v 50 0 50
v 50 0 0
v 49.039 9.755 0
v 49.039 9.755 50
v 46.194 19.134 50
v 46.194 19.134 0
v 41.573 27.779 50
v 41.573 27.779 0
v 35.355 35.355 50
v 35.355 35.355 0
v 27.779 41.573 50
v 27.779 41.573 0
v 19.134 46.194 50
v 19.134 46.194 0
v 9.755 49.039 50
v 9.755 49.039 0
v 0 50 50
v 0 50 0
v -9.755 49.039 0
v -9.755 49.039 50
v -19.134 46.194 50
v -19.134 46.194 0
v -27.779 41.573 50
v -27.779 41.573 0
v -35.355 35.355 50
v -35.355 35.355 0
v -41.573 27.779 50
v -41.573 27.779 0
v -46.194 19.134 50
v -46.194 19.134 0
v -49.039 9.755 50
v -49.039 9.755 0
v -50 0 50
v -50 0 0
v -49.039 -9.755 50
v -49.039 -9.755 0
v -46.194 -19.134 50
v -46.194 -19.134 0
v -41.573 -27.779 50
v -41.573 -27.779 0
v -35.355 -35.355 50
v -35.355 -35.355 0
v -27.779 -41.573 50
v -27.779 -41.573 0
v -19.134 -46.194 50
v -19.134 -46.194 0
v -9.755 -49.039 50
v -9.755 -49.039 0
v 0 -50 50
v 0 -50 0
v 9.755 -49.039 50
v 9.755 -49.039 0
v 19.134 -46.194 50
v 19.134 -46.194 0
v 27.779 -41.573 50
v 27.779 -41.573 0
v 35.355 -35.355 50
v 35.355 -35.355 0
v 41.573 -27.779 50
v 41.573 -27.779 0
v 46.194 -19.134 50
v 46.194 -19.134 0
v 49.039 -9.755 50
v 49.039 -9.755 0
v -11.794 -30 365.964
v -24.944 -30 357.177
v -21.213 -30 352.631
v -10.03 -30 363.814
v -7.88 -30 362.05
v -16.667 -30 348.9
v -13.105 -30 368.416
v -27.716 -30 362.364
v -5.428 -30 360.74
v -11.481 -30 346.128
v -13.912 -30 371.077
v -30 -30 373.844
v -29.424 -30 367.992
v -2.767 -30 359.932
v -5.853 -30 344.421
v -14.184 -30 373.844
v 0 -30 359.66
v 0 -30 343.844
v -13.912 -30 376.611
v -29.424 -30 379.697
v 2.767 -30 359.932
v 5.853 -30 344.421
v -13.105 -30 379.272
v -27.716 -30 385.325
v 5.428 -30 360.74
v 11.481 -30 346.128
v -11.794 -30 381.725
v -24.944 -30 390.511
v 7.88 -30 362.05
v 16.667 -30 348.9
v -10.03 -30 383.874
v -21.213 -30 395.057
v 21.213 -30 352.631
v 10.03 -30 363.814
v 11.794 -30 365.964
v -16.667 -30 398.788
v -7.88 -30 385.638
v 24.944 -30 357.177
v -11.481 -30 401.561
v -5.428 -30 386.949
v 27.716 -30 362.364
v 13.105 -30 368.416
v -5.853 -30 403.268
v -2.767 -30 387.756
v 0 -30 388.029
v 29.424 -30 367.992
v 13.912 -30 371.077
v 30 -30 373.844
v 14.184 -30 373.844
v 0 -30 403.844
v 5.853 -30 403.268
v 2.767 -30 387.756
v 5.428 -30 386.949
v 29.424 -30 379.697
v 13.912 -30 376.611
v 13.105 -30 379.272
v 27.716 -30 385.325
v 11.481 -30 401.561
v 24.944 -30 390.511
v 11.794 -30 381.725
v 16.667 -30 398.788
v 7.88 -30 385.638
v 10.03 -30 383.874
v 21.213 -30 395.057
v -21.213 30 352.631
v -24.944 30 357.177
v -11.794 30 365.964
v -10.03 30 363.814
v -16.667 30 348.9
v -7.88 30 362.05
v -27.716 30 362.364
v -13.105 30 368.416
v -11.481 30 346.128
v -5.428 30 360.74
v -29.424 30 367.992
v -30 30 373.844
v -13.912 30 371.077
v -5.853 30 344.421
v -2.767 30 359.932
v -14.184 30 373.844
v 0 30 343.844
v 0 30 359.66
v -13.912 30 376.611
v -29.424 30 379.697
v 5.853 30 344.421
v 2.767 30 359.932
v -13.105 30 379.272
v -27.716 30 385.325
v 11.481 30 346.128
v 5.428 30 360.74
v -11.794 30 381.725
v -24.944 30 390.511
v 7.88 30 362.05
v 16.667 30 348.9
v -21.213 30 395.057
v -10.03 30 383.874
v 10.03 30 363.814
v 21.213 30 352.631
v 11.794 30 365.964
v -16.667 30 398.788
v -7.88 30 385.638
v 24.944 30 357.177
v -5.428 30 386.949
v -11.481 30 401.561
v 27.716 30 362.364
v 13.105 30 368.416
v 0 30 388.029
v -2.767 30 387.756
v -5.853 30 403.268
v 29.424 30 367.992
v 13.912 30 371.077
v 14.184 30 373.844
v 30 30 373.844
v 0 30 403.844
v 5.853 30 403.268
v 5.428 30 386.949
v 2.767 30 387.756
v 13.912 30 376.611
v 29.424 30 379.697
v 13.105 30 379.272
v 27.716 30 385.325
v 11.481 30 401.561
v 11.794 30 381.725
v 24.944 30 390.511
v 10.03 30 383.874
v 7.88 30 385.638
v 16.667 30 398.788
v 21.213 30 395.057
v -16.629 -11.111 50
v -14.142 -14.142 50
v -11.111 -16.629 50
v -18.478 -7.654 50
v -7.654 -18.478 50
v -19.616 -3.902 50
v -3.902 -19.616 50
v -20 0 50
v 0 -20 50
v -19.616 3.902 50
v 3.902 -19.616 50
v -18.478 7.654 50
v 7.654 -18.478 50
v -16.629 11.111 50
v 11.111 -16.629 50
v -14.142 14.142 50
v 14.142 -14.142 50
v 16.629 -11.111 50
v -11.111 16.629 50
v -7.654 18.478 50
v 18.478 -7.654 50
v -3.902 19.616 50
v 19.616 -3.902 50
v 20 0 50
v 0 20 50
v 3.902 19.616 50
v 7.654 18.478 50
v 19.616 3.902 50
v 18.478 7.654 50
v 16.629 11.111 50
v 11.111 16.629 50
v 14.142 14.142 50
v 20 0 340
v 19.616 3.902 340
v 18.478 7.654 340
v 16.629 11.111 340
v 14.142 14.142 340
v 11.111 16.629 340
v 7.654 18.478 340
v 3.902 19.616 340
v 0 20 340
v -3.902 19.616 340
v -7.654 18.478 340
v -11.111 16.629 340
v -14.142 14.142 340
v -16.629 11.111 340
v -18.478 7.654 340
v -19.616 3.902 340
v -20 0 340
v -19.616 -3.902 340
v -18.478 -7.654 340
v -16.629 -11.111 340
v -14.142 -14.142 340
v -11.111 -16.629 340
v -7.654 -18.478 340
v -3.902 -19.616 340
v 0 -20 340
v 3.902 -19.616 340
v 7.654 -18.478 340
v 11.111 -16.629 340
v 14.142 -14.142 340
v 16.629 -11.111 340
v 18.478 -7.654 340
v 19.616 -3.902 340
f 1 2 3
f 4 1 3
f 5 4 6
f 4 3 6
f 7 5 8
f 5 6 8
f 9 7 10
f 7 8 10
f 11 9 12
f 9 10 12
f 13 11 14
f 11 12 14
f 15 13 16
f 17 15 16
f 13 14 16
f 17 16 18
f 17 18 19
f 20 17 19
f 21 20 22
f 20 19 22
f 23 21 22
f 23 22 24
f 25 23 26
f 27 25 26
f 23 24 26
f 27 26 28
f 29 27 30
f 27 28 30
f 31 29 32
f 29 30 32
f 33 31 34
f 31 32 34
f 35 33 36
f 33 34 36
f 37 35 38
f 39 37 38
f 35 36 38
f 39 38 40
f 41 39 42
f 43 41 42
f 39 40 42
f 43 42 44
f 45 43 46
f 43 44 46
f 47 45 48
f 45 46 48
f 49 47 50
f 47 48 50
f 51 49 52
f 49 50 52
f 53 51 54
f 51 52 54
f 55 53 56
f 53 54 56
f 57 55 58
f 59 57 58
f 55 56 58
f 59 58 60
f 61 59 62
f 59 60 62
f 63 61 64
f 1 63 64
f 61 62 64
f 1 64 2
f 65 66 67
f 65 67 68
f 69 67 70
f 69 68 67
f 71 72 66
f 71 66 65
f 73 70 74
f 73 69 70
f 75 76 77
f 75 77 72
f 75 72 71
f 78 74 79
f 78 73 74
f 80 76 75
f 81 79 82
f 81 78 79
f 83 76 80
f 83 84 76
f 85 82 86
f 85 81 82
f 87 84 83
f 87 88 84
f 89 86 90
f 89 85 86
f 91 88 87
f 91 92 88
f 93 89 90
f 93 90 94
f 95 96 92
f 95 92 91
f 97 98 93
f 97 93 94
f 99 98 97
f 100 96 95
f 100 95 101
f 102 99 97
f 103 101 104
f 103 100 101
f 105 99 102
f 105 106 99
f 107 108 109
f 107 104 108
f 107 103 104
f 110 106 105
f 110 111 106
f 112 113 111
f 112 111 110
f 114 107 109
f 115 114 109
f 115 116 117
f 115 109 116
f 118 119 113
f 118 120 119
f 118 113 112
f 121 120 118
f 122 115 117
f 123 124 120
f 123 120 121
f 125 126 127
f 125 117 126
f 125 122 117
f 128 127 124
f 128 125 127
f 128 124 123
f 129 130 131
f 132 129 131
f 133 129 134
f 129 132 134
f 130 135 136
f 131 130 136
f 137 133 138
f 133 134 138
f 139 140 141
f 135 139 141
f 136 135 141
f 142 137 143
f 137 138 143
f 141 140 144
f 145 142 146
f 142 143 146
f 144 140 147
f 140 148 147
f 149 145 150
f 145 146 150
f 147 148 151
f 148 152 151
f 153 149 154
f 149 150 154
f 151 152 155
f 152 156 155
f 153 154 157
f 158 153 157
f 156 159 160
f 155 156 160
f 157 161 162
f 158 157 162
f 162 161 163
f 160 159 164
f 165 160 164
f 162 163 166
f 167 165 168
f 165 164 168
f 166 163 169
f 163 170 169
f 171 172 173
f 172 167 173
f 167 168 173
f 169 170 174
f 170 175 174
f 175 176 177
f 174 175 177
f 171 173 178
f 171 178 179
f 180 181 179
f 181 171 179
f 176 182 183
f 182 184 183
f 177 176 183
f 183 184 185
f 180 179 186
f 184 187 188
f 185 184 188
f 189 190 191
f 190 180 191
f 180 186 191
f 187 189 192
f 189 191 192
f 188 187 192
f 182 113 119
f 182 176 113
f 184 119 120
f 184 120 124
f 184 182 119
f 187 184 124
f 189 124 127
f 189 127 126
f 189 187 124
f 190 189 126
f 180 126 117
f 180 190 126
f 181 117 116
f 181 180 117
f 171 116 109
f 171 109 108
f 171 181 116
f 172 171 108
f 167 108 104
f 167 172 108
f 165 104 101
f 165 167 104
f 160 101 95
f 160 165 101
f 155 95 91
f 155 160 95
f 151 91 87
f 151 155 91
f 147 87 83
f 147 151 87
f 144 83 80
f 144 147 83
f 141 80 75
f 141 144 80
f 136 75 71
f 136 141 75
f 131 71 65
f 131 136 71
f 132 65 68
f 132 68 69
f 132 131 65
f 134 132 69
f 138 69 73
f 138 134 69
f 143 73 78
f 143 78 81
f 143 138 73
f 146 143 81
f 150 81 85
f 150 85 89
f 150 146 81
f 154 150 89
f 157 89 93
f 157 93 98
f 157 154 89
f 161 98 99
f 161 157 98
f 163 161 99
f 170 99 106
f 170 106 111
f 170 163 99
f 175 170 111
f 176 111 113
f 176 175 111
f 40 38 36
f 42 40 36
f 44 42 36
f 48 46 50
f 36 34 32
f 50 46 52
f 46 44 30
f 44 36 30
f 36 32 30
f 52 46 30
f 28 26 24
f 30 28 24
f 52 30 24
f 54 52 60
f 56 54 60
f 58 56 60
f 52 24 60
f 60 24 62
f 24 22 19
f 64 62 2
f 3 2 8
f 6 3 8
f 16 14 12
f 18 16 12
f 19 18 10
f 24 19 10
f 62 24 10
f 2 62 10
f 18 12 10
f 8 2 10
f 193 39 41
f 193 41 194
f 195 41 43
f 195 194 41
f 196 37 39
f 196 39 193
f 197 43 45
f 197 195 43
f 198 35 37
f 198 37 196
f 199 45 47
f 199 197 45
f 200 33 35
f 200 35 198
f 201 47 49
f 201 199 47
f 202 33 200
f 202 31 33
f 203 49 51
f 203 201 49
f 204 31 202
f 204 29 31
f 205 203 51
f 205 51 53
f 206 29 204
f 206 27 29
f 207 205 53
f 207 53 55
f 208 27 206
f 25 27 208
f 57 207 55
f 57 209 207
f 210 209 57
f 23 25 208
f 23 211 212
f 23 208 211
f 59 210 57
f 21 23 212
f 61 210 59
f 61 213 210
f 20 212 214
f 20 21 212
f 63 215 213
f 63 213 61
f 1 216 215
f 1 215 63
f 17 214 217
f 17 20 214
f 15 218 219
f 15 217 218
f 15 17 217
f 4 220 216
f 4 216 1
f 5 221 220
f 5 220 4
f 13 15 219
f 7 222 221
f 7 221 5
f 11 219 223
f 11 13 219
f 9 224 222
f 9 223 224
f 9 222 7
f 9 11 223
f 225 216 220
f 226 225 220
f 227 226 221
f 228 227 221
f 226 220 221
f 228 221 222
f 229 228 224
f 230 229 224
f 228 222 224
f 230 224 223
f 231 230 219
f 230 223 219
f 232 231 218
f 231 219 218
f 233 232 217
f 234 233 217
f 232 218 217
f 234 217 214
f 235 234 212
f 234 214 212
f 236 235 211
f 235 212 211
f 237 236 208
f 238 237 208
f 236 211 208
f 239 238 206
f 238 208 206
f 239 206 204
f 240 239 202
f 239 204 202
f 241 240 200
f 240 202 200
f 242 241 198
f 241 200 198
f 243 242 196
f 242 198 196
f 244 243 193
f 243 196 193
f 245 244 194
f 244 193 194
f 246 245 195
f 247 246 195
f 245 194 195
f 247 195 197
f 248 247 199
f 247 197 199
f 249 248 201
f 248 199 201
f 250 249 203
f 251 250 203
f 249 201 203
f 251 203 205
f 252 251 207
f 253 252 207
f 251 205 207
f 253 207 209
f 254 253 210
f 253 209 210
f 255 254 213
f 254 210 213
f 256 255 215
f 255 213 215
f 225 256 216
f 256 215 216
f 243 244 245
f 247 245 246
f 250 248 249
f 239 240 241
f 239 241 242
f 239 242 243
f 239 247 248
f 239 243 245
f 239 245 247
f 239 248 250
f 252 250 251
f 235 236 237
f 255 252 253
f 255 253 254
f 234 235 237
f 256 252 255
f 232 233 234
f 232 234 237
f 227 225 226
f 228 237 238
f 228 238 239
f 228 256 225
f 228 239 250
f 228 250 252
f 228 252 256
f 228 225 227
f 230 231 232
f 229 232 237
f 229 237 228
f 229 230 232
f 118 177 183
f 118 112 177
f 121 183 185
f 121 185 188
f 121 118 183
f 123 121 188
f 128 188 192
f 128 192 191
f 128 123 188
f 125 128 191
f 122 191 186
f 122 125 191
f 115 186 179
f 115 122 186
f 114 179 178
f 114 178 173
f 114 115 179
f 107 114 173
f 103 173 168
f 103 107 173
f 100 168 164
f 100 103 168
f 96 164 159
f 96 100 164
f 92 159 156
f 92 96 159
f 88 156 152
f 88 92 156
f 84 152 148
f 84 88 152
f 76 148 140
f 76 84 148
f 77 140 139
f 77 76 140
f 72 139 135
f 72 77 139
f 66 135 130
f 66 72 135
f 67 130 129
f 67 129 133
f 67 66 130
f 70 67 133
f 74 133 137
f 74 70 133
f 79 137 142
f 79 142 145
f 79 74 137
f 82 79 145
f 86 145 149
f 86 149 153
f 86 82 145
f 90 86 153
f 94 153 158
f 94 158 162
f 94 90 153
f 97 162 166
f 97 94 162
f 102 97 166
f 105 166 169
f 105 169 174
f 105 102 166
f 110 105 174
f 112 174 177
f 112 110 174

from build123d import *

# Parameters (mm, degrees)
F0_R     = 50
F1_DEPTH = 50
F2_R     = 20
F3_DEPTH = 290
F4_R     = 30
F4_R_2   = 14.184342
F5_DEPTH = 30


with BuildPart() as f1:
    # F0 (on Top) → F1 (new body)
    with BuildSketch(Plane.XY):
        Circle(F0_R)
    extrude(amount=F1_DEPTH)

    # F2 (on face) → F3 (join)
    with BuildSketch(Plane.XY.offset(50)):
        Circle(F2_R)
    extrude(amount=F3_DEPTH)


with BuildPart() as f5:
    # F4 (on Front) → F5 (new body, symmetric)
    with BuildSketch(Plane.XZ):
        with Locations((0, 373.844266)):
            Circle(F4_R)
        with Locations((0, 373.844266)):
            Circle(F4_R_2, mode=Mode.SUBTRACT)
    extrude(amount=F5_DEPTH, both=True)


solid = Compound([f1.part, f5.part])
